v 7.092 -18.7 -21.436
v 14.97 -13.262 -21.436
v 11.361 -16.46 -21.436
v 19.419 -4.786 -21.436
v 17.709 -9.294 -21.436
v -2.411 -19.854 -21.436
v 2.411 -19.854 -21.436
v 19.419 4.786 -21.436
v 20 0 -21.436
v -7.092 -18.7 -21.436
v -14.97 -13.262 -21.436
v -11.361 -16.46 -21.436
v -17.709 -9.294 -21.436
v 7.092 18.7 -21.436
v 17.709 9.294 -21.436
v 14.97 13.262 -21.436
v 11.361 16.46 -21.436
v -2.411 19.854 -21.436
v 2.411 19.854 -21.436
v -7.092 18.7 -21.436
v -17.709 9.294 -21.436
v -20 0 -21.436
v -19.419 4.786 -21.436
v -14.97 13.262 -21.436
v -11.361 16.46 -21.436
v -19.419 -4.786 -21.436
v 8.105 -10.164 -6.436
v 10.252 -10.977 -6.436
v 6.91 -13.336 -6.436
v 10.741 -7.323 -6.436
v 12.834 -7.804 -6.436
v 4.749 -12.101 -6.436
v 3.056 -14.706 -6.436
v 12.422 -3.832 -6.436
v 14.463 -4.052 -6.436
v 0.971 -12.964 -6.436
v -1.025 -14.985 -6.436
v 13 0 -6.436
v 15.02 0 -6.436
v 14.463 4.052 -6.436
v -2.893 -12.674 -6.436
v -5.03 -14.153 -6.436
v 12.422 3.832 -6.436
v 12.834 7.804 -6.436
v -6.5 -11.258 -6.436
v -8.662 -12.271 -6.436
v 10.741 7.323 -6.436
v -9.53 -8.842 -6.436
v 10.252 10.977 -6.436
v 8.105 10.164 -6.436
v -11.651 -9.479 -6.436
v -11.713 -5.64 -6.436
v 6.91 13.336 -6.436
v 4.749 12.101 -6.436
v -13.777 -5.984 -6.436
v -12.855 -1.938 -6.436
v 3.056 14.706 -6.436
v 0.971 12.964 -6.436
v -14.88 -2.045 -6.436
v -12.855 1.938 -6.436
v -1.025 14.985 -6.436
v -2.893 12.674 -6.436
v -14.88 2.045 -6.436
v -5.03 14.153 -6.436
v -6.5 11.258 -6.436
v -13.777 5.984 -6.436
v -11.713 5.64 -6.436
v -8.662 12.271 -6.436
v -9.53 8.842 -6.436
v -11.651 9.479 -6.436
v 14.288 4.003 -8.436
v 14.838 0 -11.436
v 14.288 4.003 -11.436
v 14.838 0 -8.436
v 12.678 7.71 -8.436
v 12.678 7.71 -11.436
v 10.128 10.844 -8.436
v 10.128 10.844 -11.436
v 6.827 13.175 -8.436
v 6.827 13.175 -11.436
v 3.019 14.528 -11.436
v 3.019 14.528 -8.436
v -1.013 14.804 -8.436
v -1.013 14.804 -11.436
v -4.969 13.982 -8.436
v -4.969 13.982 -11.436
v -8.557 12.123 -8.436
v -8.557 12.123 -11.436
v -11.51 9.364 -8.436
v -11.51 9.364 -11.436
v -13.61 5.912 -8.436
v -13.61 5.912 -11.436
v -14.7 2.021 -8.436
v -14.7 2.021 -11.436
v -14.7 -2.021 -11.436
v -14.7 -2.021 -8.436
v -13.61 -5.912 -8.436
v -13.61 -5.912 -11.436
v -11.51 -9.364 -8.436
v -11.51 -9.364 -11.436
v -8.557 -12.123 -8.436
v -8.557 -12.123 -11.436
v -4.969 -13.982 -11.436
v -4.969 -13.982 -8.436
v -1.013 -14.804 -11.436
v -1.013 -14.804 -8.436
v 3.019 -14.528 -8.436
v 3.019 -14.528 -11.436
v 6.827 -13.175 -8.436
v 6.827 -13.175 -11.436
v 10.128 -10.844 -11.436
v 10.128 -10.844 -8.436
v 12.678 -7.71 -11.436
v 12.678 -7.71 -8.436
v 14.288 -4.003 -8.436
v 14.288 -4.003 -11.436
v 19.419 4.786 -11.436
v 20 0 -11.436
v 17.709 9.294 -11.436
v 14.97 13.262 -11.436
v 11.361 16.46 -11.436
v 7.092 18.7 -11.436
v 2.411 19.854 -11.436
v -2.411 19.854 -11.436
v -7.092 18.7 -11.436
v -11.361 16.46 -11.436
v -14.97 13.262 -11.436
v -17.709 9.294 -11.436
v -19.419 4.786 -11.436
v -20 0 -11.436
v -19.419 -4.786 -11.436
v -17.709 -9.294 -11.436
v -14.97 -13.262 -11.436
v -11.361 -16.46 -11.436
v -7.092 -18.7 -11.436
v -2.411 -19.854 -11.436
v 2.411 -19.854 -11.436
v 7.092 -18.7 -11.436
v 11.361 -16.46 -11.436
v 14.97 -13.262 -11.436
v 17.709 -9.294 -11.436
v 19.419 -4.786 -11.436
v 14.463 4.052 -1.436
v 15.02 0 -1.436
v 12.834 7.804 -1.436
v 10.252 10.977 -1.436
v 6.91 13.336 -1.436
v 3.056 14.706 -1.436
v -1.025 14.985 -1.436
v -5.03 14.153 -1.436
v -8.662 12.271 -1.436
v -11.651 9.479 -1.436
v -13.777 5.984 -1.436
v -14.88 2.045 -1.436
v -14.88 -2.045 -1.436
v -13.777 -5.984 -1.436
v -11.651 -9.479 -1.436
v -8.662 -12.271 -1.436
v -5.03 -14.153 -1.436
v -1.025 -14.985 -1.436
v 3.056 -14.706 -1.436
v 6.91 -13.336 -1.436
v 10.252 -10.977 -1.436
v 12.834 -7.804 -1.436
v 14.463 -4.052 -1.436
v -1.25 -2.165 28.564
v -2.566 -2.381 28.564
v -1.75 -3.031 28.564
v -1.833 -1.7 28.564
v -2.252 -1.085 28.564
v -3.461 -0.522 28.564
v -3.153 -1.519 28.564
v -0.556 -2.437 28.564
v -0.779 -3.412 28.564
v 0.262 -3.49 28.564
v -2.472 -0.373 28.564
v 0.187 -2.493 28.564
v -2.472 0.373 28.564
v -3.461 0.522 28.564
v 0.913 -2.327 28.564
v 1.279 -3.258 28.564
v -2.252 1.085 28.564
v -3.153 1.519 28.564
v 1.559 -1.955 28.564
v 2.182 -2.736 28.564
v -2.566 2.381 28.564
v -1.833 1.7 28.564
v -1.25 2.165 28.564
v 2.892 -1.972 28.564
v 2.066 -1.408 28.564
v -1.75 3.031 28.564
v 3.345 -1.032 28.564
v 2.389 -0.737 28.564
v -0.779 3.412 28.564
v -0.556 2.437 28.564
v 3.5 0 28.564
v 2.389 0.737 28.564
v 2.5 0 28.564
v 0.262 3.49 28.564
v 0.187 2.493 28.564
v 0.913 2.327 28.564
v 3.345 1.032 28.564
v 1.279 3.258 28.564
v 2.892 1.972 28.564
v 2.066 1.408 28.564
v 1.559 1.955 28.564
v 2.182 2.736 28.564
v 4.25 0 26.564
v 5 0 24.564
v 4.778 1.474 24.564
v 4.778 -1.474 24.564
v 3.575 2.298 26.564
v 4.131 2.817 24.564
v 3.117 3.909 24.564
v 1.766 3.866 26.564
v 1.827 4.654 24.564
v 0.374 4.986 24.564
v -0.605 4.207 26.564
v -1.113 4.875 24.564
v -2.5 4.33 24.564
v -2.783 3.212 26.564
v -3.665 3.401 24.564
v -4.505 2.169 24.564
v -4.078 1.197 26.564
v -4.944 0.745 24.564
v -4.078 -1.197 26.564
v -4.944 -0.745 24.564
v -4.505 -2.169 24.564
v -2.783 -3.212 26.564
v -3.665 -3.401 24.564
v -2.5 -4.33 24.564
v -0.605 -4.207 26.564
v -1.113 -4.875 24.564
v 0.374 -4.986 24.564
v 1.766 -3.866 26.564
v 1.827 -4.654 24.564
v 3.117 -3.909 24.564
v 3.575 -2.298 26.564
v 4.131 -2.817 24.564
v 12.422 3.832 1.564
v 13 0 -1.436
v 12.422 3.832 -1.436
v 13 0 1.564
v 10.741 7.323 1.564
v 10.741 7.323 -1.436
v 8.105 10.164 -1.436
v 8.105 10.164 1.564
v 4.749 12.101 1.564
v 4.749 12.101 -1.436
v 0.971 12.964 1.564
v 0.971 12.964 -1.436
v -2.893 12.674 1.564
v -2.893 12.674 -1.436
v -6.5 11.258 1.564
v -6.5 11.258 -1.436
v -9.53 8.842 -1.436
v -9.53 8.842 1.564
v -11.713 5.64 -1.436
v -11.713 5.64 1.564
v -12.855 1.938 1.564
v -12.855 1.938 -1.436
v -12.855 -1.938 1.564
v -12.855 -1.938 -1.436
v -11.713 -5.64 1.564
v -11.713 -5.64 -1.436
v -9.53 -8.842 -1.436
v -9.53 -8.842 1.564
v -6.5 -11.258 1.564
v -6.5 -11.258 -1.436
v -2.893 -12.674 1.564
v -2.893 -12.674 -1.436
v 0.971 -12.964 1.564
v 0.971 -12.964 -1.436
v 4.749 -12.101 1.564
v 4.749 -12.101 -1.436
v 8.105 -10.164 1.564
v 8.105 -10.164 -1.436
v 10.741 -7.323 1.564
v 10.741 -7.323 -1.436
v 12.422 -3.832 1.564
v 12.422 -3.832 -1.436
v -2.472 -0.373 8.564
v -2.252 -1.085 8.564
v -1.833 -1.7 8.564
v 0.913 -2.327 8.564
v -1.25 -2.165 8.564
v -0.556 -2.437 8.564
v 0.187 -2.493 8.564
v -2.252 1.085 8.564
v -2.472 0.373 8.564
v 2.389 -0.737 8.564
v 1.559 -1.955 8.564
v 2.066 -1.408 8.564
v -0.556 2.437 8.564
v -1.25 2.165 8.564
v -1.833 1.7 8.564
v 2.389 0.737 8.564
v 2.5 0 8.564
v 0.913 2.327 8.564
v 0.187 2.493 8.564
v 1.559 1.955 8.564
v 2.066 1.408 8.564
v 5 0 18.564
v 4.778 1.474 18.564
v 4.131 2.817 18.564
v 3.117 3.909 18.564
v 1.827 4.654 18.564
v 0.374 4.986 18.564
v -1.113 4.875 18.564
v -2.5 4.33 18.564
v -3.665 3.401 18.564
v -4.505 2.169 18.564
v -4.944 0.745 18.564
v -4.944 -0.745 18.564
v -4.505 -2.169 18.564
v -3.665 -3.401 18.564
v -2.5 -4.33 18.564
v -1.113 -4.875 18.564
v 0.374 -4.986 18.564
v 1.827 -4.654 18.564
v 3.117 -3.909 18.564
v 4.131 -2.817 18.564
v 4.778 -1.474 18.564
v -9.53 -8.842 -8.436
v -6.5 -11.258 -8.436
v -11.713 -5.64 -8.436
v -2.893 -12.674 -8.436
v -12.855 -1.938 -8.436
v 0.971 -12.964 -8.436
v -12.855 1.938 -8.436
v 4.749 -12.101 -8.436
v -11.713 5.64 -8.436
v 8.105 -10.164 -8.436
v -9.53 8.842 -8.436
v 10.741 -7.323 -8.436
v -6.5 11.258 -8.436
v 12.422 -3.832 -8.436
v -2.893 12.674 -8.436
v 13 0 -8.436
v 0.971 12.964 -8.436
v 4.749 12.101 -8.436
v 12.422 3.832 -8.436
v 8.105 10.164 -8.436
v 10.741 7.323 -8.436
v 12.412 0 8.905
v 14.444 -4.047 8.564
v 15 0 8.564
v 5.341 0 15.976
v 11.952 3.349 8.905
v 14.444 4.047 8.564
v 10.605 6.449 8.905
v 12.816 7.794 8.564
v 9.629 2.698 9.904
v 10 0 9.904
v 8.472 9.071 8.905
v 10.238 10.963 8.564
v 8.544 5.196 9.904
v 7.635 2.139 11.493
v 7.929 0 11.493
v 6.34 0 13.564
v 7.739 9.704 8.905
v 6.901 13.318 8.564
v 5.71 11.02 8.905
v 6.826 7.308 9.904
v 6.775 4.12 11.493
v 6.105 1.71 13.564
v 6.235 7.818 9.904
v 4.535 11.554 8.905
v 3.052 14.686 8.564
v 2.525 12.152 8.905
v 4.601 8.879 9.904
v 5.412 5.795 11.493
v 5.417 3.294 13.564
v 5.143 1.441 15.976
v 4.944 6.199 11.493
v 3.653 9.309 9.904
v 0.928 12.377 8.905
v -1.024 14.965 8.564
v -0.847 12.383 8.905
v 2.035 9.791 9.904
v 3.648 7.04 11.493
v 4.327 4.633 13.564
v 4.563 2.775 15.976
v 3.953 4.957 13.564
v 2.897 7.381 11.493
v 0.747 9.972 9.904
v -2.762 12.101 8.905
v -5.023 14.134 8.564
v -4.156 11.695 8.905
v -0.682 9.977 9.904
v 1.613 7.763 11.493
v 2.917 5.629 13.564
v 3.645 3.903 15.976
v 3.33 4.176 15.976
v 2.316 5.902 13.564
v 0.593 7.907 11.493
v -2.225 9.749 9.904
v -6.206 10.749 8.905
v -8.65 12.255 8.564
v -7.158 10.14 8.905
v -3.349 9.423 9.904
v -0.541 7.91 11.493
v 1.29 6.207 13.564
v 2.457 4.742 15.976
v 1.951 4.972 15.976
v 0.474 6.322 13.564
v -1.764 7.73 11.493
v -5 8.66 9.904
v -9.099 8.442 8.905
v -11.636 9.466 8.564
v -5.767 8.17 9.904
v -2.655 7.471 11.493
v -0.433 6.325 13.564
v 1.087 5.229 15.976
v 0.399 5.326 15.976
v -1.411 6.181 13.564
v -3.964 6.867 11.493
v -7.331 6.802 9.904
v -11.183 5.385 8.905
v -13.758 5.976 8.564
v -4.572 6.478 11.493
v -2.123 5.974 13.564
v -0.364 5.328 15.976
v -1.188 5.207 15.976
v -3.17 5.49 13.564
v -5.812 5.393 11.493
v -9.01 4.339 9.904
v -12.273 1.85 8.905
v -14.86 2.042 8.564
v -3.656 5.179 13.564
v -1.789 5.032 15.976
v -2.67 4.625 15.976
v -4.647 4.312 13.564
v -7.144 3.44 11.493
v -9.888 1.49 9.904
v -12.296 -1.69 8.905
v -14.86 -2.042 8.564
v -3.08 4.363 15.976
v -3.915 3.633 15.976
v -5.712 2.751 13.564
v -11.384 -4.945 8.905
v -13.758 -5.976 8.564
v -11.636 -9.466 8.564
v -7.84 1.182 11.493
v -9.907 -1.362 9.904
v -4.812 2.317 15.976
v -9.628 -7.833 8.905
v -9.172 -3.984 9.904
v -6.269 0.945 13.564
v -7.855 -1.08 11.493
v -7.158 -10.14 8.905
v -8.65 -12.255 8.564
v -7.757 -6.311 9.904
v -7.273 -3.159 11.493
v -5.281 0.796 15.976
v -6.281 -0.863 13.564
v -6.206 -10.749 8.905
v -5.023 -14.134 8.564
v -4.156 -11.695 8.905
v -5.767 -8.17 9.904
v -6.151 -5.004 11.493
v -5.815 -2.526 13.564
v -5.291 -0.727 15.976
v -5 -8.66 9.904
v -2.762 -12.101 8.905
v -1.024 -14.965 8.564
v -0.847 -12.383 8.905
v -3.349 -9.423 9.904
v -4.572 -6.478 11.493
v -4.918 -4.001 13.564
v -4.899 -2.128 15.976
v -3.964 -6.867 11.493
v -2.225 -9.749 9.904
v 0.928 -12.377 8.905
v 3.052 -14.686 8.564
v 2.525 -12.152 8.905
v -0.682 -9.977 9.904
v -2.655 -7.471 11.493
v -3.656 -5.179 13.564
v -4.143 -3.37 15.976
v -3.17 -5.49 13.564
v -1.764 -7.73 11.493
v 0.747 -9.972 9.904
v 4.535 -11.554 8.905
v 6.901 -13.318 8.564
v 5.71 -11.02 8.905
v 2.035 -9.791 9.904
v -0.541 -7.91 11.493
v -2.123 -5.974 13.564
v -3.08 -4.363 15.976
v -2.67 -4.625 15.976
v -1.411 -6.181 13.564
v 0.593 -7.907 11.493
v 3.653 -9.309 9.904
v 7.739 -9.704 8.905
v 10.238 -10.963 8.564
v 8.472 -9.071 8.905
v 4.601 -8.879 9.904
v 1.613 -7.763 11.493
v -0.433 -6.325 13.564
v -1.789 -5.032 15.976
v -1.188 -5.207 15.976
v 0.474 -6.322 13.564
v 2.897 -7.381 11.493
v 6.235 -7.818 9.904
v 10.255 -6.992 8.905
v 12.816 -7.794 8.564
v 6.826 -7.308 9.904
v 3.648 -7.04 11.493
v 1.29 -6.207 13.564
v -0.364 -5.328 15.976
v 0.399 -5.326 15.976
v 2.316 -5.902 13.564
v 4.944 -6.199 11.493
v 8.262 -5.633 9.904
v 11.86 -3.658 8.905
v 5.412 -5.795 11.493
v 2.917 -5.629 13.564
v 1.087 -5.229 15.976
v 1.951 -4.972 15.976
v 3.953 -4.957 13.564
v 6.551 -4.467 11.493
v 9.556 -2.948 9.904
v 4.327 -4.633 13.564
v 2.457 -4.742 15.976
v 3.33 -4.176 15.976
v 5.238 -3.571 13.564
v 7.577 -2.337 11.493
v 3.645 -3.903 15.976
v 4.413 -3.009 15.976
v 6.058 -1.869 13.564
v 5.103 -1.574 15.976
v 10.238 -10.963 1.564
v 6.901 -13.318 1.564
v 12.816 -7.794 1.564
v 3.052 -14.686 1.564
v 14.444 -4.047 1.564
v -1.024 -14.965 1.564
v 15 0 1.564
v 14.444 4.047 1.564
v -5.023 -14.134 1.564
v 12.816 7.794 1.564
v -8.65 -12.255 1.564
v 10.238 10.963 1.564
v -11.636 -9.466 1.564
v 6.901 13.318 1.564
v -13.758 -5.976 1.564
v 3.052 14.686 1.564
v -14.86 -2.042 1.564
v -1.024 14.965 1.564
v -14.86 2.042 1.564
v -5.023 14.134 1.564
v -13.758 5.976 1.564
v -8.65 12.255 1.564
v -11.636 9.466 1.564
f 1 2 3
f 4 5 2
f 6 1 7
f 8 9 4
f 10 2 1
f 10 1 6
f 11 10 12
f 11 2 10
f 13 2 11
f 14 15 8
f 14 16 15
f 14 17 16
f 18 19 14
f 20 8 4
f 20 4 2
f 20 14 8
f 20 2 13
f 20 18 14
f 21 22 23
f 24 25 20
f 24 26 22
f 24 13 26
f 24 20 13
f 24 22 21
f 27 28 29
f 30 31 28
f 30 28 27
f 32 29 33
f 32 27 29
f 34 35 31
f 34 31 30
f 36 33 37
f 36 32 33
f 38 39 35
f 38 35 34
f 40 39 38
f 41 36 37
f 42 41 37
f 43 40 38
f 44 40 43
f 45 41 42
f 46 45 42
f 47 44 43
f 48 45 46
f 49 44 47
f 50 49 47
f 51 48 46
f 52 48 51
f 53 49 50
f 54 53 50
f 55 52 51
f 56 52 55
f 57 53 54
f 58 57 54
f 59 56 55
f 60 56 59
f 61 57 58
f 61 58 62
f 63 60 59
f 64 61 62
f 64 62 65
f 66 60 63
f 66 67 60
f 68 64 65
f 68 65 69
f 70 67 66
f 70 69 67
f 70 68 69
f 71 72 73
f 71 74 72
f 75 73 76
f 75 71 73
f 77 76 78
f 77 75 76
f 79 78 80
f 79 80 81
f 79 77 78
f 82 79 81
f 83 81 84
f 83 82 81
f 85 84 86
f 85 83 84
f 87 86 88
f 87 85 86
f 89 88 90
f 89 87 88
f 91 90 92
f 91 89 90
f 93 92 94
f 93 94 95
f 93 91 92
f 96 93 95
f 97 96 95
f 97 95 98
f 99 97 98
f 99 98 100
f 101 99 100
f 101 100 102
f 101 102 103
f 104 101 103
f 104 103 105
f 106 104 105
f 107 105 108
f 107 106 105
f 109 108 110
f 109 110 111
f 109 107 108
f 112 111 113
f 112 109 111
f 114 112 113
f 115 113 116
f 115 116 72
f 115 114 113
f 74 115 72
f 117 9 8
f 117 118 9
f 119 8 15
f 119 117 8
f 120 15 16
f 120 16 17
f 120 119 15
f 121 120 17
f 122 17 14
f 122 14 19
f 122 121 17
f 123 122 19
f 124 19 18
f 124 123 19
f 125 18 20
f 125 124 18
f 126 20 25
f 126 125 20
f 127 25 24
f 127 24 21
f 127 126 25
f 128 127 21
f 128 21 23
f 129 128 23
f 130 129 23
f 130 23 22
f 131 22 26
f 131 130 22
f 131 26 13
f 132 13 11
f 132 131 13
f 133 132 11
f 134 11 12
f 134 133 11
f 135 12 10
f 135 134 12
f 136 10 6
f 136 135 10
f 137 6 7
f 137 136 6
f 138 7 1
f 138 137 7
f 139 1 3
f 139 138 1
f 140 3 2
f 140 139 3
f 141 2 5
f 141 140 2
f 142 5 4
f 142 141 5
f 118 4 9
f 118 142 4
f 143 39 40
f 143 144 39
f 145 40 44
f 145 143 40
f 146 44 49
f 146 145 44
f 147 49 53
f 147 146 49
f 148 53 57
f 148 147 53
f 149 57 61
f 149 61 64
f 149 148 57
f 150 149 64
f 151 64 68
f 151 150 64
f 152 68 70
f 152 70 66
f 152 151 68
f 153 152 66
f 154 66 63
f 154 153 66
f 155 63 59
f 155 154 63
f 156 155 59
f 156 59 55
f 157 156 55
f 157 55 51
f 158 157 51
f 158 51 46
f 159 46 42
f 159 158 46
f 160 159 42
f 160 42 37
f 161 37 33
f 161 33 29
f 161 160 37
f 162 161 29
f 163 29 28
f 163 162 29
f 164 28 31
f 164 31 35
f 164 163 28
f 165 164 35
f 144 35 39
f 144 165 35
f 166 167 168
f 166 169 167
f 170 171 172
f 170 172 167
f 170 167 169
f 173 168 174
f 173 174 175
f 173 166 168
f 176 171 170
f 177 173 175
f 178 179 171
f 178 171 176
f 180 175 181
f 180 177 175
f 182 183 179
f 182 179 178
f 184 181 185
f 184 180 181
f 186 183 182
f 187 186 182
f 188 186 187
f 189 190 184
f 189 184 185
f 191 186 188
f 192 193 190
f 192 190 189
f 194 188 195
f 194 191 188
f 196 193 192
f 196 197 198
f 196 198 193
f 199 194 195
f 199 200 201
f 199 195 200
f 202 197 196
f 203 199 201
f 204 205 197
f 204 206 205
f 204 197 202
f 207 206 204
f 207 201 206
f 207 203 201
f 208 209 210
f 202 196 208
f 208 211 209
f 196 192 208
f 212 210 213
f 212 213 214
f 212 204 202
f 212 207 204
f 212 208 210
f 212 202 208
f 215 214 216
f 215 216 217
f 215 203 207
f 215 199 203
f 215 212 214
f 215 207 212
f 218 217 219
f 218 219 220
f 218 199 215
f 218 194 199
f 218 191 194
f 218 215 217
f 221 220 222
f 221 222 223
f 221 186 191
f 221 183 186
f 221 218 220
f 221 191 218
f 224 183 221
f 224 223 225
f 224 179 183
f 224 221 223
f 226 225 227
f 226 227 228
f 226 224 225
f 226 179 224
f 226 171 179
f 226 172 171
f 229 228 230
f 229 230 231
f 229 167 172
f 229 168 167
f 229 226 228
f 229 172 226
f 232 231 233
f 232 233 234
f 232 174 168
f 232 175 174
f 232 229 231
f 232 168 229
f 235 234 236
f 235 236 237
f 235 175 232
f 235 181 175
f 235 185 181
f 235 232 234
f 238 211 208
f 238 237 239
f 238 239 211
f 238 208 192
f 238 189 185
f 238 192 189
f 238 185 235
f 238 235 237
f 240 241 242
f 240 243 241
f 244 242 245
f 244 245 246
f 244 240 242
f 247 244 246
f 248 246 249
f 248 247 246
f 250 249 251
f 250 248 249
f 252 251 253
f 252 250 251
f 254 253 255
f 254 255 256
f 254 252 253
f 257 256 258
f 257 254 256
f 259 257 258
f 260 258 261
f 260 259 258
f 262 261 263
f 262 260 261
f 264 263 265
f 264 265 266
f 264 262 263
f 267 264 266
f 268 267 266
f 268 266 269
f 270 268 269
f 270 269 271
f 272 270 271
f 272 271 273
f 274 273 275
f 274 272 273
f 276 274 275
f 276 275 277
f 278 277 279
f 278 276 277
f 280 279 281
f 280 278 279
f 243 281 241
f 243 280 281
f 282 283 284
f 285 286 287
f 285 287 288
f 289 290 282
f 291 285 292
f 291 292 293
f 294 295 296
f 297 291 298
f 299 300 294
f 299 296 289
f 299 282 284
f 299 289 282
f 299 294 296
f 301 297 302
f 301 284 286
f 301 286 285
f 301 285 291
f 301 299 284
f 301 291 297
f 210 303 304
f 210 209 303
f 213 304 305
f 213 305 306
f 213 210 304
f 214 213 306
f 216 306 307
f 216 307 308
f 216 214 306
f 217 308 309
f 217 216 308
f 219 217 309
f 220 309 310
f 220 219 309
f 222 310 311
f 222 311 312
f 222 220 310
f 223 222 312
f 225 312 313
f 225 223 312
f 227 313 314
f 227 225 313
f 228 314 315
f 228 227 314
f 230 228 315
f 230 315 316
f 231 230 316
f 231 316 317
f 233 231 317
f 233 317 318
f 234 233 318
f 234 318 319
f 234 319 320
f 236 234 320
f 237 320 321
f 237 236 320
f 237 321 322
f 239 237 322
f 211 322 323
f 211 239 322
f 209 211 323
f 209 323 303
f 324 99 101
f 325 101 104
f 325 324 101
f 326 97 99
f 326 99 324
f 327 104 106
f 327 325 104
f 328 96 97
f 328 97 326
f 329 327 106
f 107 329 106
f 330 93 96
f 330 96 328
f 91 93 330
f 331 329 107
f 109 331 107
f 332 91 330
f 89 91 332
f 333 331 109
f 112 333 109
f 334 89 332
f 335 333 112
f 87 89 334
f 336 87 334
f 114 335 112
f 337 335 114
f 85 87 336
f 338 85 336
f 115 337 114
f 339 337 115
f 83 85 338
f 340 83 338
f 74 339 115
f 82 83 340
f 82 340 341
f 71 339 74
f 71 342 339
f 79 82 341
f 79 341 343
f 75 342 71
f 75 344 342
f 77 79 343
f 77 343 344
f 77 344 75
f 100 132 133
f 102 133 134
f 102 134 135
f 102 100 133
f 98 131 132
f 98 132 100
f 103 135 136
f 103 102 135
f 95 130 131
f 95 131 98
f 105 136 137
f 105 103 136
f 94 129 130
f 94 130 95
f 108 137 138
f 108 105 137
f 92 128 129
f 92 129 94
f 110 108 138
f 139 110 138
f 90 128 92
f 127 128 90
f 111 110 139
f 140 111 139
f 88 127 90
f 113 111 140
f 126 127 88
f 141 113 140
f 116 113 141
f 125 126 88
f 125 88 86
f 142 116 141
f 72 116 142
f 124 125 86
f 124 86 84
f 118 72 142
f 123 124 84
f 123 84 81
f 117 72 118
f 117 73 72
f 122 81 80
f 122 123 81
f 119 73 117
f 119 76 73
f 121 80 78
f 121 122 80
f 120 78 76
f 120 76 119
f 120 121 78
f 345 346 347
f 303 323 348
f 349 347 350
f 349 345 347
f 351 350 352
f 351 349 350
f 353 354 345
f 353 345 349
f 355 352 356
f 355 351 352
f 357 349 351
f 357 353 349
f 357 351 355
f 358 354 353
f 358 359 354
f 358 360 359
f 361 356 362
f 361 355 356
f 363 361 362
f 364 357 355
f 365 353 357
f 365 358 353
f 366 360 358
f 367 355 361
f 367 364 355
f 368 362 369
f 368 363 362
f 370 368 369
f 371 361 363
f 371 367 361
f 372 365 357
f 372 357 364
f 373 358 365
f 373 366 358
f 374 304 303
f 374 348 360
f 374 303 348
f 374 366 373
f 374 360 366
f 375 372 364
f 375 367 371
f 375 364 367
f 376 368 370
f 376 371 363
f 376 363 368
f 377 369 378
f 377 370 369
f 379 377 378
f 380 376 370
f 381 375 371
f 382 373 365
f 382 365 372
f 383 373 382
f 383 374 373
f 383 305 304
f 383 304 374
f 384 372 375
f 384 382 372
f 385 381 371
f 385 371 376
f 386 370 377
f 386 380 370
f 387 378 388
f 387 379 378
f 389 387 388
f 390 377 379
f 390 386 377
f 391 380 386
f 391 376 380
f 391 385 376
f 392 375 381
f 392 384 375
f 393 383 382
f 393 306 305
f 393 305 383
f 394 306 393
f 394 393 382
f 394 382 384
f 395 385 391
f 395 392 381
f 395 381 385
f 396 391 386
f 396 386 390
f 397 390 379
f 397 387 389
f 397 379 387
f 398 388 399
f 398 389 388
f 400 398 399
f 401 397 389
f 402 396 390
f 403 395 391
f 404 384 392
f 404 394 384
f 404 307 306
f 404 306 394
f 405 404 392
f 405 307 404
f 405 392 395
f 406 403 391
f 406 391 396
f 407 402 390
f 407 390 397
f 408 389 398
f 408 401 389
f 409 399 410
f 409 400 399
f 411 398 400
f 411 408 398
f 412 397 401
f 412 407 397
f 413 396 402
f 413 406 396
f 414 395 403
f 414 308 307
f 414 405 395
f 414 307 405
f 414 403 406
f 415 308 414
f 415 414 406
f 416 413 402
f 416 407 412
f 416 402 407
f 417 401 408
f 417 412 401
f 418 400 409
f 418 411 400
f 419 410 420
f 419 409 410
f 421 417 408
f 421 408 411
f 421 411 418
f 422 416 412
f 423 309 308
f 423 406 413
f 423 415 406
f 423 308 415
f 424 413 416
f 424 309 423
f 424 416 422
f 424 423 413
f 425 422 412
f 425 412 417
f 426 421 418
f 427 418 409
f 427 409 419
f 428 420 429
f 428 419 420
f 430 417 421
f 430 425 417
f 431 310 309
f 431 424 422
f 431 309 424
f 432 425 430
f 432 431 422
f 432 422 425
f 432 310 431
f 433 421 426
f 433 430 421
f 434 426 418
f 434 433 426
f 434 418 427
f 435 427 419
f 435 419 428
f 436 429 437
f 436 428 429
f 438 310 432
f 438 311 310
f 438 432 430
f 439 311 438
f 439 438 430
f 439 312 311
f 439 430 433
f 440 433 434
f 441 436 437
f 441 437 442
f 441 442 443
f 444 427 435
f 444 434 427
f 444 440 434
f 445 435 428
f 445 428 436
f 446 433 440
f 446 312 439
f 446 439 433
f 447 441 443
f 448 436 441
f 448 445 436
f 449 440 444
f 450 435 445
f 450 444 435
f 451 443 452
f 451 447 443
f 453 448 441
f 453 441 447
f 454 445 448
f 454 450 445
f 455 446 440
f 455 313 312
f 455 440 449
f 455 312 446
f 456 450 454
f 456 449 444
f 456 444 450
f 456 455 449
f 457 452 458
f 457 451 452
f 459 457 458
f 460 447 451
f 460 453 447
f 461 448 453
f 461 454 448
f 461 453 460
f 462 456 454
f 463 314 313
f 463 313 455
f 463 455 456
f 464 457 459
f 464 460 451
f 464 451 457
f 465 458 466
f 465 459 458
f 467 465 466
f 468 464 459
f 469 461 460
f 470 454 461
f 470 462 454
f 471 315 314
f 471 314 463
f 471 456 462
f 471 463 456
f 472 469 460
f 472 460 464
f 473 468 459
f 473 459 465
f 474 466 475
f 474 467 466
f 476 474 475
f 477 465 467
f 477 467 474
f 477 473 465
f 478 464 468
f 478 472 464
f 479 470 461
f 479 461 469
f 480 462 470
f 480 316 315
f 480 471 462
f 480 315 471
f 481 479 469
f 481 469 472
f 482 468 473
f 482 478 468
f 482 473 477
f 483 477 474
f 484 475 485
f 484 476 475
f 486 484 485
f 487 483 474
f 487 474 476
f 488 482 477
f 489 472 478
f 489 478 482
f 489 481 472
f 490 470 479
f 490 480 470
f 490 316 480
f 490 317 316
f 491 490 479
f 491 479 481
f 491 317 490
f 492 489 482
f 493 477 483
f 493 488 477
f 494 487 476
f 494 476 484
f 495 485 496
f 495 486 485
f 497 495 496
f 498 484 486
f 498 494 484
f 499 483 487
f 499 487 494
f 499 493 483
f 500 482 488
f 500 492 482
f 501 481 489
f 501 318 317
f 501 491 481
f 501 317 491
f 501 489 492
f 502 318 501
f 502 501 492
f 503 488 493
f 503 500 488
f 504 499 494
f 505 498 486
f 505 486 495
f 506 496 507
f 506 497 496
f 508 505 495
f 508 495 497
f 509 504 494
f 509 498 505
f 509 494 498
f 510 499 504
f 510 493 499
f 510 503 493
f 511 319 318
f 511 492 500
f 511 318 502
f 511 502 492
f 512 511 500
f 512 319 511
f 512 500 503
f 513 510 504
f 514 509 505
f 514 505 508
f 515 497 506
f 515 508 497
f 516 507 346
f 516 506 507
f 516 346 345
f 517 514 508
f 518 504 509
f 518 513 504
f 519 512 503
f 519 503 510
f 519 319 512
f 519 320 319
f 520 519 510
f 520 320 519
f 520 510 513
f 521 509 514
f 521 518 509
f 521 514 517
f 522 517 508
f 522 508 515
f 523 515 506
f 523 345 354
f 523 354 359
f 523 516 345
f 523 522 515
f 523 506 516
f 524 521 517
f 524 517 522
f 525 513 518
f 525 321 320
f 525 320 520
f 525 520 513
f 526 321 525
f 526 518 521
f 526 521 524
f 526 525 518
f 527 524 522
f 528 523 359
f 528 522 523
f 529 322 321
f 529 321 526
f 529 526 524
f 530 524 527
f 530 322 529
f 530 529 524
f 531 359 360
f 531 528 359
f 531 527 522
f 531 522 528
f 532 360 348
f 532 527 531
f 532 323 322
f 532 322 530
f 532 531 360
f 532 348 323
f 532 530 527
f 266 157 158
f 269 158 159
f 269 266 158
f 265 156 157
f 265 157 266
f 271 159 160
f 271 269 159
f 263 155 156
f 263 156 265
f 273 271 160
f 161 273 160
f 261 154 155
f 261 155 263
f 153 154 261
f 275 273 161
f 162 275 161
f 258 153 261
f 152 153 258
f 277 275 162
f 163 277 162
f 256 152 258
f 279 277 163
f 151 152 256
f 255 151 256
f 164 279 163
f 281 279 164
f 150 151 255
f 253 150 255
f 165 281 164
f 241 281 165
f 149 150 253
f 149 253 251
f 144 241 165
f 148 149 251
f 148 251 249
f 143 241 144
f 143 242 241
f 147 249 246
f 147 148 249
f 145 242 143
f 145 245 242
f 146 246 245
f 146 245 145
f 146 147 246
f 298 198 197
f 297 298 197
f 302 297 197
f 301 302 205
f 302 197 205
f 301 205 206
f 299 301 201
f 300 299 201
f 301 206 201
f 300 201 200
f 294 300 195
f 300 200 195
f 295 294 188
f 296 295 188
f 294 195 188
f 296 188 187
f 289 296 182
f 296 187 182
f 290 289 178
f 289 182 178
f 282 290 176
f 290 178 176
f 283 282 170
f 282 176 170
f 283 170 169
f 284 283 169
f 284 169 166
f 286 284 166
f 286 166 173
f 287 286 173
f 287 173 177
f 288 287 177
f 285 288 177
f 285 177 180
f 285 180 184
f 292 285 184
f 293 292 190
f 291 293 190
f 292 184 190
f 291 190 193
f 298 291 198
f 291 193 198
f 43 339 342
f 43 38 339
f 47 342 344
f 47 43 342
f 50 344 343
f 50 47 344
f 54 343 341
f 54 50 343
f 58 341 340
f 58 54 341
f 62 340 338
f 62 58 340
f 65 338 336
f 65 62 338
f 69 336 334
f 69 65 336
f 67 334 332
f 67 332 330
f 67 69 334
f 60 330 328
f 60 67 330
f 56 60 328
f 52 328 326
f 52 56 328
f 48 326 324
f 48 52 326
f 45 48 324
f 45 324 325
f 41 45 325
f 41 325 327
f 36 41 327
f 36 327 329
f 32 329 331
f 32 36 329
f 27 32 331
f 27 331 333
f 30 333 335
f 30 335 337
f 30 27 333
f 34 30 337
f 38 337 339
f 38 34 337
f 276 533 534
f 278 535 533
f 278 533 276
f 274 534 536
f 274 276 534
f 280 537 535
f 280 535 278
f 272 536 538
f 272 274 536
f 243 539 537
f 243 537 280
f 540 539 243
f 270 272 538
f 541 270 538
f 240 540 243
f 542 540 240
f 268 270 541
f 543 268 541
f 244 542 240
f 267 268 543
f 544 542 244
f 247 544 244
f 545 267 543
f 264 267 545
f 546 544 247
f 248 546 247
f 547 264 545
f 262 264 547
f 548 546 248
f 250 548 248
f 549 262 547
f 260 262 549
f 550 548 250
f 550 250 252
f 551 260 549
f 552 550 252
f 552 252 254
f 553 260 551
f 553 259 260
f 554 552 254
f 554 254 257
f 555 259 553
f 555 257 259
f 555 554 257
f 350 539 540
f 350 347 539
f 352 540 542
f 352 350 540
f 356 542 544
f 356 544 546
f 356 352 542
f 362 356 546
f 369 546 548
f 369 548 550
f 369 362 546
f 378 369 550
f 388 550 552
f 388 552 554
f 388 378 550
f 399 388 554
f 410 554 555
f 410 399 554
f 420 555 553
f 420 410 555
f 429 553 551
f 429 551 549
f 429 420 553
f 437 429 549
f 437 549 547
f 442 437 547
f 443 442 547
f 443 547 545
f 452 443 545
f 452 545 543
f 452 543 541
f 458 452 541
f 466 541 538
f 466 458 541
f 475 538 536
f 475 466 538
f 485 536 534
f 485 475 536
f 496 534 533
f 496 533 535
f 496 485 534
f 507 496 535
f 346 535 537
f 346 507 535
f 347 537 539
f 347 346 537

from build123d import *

# Parameters (mm, degrees)
F2_R     = 2.5
F3_DEPTH = 20


with BuildPart() as f1:
    # F0 (on Front) → F1 (revolve)
    with BuildSketch(Plane.XZ):
        with BuildLine():
            Line((0, -21.435744), (20, -21.435744))
            Line((20, -21.435744), (20, -11.435744))
            Line((20, -11.435744), (14.838474, -11.435744))
            Line((14.838474, -11.435744), (14.838474, -8.435744))
            Line((14.838474, -8.435744), (13, -8.435744))
            Line((13, -8.435744), (13, -6.435744))
            Line((13, -6.435744), (15.020292, -6.435744))
            Line((15.020292, -6.435744), (15.020292, -1.435744))
            Line((15.020292, -1.435744), (13, -1.435744))
            Line((13, -1.435744), (13, 1.564256))
            Line((13, 1.564256), (15, 1.564256))
            Line((15, 1.564256), (15, 8.564256))
            ThreePointArc((15, 8.564256), (7.928932, 11.493188), (5, 18.564256))
            Line((5, 18.564256), (5, 24.564256))
            Line((5, 24.564256), (3.5, 28.564256))
            Line((3.5, 28.564256), (0, 28.564256))
            Line((0, 28.564256), (0, -21.435744))
        make_face()
    revolve(axis=Axis((0, 0, 3.564256), (0, 0, 1)))

    # F2 (on face) → F3 (cut)
    with BuildSketch(Plane.XY.offset(28.564256)):
        Circle(F2_R)
    extrude(amount=-F3_DEPTH, mode=Mode.SUBTRACT)


solid = f1.part
